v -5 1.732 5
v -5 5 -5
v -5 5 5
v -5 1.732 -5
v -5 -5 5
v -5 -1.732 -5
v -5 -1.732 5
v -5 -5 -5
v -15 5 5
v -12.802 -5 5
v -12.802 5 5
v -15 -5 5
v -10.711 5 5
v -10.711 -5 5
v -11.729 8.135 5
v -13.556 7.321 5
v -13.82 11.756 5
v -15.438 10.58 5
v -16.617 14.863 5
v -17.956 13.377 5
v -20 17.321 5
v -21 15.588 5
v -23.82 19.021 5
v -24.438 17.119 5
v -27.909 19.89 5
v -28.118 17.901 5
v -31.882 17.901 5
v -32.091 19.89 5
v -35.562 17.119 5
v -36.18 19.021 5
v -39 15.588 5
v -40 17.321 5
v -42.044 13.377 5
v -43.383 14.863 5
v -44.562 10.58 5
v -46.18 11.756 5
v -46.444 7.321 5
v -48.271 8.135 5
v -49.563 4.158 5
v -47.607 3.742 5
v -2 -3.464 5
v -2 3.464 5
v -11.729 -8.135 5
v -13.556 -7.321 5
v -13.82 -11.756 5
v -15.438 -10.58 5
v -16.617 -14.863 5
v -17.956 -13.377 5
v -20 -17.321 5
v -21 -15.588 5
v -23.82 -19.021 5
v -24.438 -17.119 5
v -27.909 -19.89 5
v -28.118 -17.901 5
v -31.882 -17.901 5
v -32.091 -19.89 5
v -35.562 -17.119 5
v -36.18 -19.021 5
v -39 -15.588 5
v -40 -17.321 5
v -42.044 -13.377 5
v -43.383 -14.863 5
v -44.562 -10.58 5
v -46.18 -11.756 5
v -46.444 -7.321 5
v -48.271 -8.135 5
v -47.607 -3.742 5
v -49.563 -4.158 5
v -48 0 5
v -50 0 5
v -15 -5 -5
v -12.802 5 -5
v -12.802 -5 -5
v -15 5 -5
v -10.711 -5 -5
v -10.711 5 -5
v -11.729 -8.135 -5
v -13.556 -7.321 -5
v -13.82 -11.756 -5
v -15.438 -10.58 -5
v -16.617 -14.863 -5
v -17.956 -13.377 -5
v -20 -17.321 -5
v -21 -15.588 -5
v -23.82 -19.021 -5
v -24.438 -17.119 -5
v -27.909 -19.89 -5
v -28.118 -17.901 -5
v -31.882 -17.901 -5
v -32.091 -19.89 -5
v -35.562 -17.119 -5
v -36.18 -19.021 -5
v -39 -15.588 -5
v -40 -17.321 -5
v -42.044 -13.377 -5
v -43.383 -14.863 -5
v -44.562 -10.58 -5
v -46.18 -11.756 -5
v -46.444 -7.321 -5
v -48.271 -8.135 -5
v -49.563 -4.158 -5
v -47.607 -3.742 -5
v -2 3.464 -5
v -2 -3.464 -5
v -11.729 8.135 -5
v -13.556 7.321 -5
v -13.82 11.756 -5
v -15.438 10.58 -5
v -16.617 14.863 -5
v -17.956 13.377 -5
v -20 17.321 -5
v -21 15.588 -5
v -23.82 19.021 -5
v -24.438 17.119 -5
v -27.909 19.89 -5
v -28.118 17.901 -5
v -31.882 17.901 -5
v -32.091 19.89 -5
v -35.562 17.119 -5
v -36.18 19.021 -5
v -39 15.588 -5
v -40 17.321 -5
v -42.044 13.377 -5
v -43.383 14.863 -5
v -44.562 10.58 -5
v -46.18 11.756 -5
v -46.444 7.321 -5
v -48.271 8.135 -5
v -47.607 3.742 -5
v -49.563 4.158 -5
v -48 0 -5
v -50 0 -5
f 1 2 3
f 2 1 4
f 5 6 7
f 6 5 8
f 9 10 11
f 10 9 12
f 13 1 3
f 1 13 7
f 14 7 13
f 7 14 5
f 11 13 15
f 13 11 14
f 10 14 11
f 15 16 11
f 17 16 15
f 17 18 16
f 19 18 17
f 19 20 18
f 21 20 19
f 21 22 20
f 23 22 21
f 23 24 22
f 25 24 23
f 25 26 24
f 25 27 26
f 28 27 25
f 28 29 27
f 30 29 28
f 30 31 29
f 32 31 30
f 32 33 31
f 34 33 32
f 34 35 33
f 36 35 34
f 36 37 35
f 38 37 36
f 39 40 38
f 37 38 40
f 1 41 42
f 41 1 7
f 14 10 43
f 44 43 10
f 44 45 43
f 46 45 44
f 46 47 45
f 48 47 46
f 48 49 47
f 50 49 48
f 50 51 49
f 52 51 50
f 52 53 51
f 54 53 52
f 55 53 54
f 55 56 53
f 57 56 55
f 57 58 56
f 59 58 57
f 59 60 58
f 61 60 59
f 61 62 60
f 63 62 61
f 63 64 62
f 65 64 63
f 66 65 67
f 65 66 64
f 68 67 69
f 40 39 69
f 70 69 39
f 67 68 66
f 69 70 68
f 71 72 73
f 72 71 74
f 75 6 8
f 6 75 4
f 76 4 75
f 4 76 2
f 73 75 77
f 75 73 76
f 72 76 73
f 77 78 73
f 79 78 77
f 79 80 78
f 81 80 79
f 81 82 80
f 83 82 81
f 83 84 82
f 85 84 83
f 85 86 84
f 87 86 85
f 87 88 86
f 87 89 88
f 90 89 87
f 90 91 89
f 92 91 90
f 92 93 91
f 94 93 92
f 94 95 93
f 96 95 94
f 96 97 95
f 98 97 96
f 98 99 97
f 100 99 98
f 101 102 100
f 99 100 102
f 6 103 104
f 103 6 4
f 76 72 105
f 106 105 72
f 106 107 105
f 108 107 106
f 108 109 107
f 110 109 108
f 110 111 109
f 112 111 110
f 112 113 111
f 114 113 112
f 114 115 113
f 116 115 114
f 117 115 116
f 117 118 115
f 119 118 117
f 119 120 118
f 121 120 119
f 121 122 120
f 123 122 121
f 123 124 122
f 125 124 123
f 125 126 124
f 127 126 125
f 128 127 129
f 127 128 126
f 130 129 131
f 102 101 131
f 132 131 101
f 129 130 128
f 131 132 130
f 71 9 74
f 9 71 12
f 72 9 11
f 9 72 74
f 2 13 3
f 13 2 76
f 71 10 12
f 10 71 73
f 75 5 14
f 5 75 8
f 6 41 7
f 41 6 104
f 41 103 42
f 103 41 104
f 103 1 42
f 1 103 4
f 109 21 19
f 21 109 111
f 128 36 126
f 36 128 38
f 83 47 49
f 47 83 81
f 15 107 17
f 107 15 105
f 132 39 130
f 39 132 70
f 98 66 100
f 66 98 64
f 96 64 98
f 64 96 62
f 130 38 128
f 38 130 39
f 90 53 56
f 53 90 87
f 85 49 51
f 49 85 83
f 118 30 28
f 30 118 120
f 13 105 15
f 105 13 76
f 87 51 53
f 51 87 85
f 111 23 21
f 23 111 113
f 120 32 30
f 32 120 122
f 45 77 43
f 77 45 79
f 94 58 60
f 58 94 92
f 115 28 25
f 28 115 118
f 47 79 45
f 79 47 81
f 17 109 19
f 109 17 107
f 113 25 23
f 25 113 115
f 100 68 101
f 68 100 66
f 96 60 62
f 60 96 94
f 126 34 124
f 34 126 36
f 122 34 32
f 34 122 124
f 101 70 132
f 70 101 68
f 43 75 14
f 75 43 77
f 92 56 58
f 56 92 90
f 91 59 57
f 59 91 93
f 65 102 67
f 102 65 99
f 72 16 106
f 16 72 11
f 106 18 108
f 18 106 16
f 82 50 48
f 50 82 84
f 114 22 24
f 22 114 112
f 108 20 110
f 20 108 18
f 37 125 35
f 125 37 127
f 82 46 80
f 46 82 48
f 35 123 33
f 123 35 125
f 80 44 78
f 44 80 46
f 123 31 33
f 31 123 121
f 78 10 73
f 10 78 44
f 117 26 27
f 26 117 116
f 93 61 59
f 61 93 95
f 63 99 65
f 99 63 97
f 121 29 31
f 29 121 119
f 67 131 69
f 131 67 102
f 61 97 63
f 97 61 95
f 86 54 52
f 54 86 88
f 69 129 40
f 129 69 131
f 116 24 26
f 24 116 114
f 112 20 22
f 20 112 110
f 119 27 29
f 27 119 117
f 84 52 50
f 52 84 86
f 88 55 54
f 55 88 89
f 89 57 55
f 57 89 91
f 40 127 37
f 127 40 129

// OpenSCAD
union(){
        //Objeto original
        translate([-10,0,0])
        cube([10,10,10],center = true);
        
        //objeto a ser subtraído
        translate([-4,0,-5])
        rotate([0,00,180])
        cylinder(h = 10,r= 4, $fn = 3);

}

translate([-30,0,0])
difference(){
cylinder(h = 10,r =20,center = true);
cylinder(h = 12,r = 18,center = true);
}
